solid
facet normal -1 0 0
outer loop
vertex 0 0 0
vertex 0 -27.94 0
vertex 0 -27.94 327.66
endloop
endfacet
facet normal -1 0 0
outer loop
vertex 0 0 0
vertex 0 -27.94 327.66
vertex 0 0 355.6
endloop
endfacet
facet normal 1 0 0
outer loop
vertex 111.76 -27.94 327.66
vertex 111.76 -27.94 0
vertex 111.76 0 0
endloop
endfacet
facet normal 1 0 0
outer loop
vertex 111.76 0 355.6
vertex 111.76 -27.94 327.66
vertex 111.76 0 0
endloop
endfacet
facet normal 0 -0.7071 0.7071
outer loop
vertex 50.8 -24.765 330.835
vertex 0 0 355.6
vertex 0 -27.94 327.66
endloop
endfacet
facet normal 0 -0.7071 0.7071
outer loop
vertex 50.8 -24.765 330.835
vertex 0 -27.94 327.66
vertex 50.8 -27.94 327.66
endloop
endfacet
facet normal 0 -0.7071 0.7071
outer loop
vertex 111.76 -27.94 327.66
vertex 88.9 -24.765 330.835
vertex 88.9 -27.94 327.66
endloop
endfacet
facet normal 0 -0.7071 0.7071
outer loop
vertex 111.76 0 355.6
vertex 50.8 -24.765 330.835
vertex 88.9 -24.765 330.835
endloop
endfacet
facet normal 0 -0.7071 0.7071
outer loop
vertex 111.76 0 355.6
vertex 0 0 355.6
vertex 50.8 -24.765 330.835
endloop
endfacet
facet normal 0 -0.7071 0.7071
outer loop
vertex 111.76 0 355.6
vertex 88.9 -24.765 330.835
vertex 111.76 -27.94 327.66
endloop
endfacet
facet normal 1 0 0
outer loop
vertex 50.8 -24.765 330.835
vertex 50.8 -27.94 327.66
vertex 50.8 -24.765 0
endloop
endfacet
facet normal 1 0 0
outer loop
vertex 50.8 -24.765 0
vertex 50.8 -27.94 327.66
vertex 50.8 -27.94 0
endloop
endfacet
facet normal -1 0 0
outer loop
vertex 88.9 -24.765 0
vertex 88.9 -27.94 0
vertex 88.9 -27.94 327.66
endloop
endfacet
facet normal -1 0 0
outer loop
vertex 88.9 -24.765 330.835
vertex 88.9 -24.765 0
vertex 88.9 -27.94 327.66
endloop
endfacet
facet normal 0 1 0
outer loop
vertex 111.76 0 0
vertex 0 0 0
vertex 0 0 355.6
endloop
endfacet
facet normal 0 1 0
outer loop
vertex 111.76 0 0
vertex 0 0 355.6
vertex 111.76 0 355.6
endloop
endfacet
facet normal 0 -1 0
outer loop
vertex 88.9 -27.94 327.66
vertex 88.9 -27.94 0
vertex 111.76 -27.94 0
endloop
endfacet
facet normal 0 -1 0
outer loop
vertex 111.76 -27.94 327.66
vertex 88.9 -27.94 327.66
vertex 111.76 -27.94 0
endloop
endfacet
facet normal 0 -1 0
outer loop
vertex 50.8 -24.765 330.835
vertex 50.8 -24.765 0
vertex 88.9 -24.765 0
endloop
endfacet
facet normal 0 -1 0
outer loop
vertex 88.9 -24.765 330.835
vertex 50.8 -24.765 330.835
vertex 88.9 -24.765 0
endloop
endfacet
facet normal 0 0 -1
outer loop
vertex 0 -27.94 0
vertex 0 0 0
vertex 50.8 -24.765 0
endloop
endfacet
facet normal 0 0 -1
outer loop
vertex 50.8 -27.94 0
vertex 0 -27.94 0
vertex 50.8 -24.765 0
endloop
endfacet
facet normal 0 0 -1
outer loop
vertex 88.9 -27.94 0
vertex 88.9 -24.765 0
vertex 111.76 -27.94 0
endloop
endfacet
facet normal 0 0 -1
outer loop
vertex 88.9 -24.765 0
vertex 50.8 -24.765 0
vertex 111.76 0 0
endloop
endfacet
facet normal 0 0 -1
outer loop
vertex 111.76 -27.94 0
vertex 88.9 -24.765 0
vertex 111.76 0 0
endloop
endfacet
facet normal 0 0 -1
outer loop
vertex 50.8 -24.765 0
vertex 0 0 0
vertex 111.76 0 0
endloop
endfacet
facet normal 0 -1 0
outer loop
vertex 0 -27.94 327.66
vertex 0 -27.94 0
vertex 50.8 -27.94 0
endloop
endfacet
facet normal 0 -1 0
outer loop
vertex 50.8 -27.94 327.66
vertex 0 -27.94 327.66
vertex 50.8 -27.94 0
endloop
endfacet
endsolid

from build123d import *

# Parameters (mm, degrees)
F0_W     = 111.76
F0_H     = 27.94
F1_DEPTH = 355.6
F2_SIZE  = 27.93999
F3_W     = 38.1
F3_H     = 27.93999
F3_H_2   = 327.66001
F4_DEPTH = 3.175


# Not quite as in the source:
# - a fillet or chamfer is up to 0.001 mm smaller than in the source, because OpenCascade refuses the exact size


with BuildPart() as f1:
    # F0 (on Top) → F1 (new body)
    with BuildSketch(Plane.XY):
        with Locations((55.88, -13.97)):
            Rectangle(F0_W, F0_H)
    extrude(amount=F1_DEPTH)

    # F2 (size 27.94 in the source; OpenCascade refuses exactly that, so slightly less here)
    f2_edges = [f1.edges().sort_by_distance(p)[0] for p in [
        (55.88, -27.94, 355.6),
    ]]
    chamfer(f2_edges, length=F2_SIZE)

    # F3 (on face) → F4 (cut)
    with BuildSketch(Plane.XZ.offset(27.94)):
        with Locations((69.85, 341.630005)):
            Rectangle(F3_W, F3_H)
        with Locations((69.85, 163.830005)):
            Rectangle(F3_W, F3_H_2)
    extrude(amount=-F4_DEPTH, mode=Mode.SUBTRACT)


solid = f1.part
